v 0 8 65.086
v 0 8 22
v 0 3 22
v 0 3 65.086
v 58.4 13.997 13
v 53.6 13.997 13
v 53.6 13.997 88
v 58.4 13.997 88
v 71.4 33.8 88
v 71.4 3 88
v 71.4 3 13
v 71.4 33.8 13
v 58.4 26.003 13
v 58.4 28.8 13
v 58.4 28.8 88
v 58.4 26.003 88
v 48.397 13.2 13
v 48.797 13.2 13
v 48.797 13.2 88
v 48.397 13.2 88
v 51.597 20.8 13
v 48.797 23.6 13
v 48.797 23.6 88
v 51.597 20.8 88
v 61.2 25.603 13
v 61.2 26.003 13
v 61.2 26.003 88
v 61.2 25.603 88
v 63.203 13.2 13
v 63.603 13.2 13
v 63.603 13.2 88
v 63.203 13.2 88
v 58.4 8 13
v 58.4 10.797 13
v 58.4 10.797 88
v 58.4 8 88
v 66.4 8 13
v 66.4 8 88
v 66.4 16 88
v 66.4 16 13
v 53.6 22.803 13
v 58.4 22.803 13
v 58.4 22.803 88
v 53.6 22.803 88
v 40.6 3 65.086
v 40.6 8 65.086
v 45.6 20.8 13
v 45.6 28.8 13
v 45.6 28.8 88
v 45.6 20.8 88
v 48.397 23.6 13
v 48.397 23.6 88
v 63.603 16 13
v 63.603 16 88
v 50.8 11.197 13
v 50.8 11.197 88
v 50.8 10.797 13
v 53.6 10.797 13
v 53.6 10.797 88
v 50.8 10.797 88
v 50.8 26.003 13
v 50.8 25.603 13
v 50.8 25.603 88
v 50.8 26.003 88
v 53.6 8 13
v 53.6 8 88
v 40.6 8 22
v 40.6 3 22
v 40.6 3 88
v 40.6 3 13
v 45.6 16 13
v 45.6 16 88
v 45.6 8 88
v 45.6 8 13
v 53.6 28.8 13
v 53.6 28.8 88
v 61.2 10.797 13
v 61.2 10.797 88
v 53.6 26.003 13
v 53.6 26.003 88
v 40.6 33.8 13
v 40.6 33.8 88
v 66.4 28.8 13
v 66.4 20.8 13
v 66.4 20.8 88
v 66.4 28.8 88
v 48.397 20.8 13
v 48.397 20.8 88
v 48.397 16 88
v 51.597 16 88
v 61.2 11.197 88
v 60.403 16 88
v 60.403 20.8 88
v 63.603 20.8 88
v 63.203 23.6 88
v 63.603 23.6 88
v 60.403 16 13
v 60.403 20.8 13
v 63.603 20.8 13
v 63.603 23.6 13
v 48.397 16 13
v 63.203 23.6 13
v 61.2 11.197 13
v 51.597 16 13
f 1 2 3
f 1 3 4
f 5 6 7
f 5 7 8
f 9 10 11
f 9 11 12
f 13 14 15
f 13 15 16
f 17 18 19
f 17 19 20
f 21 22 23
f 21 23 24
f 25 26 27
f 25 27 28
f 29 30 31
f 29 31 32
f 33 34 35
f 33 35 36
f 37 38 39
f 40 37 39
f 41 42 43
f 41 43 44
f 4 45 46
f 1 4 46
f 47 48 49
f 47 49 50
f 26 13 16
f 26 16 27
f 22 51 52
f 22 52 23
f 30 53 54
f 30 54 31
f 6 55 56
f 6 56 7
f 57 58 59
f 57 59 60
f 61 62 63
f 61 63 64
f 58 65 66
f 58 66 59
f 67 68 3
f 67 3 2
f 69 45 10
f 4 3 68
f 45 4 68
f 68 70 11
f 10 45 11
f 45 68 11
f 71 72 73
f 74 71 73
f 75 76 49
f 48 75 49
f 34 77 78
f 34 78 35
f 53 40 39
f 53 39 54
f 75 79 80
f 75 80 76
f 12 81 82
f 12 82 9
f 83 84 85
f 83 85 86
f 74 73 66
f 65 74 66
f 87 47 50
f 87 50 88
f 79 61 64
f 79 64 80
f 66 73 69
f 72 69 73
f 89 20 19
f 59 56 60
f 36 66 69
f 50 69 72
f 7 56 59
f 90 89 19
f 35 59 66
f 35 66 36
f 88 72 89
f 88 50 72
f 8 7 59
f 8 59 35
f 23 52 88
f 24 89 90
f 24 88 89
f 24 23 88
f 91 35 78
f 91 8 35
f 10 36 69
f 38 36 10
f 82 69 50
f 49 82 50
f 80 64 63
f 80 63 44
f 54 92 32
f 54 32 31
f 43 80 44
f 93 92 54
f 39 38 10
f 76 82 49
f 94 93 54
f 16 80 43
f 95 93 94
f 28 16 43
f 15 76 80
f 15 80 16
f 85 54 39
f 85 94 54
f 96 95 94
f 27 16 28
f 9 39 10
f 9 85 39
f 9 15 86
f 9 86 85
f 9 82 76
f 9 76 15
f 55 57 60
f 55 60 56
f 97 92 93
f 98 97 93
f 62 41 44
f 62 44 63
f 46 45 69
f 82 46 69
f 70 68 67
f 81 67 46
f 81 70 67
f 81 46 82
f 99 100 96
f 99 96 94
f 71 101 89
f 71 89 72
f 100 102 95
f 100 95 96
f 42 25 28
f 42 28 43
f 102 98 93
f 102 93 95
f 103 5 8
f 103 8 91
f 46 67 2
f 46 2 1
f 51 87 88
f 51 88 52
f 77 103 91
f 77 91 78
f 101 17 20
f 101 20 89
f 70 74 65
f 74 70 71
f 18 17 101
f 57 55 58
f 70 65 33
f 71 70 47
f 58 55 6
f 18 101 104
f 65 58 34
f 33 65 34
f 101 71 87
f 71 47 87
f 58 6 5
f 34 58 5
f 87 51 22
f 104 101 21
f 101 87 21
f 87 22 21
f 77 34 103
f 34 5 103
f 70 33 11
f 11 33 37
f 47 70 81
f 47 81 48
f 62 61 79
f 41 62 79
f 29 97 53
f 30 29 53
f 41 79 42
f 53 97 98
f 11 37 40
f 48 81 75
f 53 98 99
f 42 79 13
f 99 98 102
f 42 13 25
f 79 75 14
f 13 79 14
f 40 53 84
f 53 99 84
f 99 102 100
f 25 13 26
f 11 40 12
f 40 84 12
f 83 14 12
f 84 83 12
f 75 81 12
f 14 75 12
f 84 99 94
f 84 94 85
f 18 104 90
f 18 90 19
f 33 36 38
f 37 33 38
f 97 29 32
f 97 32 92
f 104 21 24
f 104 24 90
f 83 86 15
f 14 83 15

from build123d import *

# Parameters (mm, degrees)
EXTRUDE_START   = 13
SKETCH_1_W      = 30.8
SKETCH_1_H      = 30.8
EXTRUDE_1_DEPTH = 75
SKETCH_3_W      = 43.086164537
SKETCH_3_H      = 5
EXTRUDE_2_DEPTH = 40.6


with BuildPart() as part:
    # ｽｹｯﾁ1 → ﾎﾞｽ - 押し出し1 (new body)
    with BuildSketch(Plane.XY.offset(EXTRUDE_START)):
        with Locations((56, 18.4)):
            Rectangle(SKETCH_1_W, SKETCH_1_H)
        Polygon((53.6, 26.002672003), (53.6, 28.8), (45.6, 28.8), (45.6, 20.8), (48.397327997, 20.8), (48.397327997, 23.6), (48.797327997, 23.6), (51.597327997, 20.8), (51.597327997, 16), (48.797327997, 13.2), (48.397327997, 13.2), (48.397327997, 16), (45.6, 16), (45.6, 8), (53.6, 8), (53.6, 10.797327997), (50.8, 10.797327997), (50.8, 11.197327997), (53.6, 13.997327997), (58.4, 13.997327997), (61.2, 11.197327997), (61.2, 10.797327997), (58.4, 10.797327997), (58.4, 8), (66.4, 8), (66.4, 16), (63.602672003, 16), (63.602672003, 13.2), (63.202672003, 13.2), (60.402672003, 16), (60.402672003, 20.8), (63.202672003, 23.6), (63.602672003, 23.6), (63.602672003, 20.8), (66.4, 20.8), (66.4, 28.8), (58.4, 28.8), (58.4, 26.002672003), (61.2, 26.002672003), (61.2, 25.602672003), (58.4, 22.802672003), (53.6, 22.802672003), (50.8, 25.602672003), (50.8, 26.002672003), align=None, mode=Mode.SUBTRACT)
    extrude(amount=EXTRUDE_1_DEPTH)

    # ｽｹｯﾁ3 → ﾎﾞｽ - 押し出し2 (add)
    with BuildSketch(Plane.ZY.offset(-40.6)):
        with Locations((43.543082269, 5.5)):
            Rectangle(SKETCH_3_W, SKETCH_3_H)
    extrude(amount=EXTRUDE_2_DEPTH)


solid = part.part
